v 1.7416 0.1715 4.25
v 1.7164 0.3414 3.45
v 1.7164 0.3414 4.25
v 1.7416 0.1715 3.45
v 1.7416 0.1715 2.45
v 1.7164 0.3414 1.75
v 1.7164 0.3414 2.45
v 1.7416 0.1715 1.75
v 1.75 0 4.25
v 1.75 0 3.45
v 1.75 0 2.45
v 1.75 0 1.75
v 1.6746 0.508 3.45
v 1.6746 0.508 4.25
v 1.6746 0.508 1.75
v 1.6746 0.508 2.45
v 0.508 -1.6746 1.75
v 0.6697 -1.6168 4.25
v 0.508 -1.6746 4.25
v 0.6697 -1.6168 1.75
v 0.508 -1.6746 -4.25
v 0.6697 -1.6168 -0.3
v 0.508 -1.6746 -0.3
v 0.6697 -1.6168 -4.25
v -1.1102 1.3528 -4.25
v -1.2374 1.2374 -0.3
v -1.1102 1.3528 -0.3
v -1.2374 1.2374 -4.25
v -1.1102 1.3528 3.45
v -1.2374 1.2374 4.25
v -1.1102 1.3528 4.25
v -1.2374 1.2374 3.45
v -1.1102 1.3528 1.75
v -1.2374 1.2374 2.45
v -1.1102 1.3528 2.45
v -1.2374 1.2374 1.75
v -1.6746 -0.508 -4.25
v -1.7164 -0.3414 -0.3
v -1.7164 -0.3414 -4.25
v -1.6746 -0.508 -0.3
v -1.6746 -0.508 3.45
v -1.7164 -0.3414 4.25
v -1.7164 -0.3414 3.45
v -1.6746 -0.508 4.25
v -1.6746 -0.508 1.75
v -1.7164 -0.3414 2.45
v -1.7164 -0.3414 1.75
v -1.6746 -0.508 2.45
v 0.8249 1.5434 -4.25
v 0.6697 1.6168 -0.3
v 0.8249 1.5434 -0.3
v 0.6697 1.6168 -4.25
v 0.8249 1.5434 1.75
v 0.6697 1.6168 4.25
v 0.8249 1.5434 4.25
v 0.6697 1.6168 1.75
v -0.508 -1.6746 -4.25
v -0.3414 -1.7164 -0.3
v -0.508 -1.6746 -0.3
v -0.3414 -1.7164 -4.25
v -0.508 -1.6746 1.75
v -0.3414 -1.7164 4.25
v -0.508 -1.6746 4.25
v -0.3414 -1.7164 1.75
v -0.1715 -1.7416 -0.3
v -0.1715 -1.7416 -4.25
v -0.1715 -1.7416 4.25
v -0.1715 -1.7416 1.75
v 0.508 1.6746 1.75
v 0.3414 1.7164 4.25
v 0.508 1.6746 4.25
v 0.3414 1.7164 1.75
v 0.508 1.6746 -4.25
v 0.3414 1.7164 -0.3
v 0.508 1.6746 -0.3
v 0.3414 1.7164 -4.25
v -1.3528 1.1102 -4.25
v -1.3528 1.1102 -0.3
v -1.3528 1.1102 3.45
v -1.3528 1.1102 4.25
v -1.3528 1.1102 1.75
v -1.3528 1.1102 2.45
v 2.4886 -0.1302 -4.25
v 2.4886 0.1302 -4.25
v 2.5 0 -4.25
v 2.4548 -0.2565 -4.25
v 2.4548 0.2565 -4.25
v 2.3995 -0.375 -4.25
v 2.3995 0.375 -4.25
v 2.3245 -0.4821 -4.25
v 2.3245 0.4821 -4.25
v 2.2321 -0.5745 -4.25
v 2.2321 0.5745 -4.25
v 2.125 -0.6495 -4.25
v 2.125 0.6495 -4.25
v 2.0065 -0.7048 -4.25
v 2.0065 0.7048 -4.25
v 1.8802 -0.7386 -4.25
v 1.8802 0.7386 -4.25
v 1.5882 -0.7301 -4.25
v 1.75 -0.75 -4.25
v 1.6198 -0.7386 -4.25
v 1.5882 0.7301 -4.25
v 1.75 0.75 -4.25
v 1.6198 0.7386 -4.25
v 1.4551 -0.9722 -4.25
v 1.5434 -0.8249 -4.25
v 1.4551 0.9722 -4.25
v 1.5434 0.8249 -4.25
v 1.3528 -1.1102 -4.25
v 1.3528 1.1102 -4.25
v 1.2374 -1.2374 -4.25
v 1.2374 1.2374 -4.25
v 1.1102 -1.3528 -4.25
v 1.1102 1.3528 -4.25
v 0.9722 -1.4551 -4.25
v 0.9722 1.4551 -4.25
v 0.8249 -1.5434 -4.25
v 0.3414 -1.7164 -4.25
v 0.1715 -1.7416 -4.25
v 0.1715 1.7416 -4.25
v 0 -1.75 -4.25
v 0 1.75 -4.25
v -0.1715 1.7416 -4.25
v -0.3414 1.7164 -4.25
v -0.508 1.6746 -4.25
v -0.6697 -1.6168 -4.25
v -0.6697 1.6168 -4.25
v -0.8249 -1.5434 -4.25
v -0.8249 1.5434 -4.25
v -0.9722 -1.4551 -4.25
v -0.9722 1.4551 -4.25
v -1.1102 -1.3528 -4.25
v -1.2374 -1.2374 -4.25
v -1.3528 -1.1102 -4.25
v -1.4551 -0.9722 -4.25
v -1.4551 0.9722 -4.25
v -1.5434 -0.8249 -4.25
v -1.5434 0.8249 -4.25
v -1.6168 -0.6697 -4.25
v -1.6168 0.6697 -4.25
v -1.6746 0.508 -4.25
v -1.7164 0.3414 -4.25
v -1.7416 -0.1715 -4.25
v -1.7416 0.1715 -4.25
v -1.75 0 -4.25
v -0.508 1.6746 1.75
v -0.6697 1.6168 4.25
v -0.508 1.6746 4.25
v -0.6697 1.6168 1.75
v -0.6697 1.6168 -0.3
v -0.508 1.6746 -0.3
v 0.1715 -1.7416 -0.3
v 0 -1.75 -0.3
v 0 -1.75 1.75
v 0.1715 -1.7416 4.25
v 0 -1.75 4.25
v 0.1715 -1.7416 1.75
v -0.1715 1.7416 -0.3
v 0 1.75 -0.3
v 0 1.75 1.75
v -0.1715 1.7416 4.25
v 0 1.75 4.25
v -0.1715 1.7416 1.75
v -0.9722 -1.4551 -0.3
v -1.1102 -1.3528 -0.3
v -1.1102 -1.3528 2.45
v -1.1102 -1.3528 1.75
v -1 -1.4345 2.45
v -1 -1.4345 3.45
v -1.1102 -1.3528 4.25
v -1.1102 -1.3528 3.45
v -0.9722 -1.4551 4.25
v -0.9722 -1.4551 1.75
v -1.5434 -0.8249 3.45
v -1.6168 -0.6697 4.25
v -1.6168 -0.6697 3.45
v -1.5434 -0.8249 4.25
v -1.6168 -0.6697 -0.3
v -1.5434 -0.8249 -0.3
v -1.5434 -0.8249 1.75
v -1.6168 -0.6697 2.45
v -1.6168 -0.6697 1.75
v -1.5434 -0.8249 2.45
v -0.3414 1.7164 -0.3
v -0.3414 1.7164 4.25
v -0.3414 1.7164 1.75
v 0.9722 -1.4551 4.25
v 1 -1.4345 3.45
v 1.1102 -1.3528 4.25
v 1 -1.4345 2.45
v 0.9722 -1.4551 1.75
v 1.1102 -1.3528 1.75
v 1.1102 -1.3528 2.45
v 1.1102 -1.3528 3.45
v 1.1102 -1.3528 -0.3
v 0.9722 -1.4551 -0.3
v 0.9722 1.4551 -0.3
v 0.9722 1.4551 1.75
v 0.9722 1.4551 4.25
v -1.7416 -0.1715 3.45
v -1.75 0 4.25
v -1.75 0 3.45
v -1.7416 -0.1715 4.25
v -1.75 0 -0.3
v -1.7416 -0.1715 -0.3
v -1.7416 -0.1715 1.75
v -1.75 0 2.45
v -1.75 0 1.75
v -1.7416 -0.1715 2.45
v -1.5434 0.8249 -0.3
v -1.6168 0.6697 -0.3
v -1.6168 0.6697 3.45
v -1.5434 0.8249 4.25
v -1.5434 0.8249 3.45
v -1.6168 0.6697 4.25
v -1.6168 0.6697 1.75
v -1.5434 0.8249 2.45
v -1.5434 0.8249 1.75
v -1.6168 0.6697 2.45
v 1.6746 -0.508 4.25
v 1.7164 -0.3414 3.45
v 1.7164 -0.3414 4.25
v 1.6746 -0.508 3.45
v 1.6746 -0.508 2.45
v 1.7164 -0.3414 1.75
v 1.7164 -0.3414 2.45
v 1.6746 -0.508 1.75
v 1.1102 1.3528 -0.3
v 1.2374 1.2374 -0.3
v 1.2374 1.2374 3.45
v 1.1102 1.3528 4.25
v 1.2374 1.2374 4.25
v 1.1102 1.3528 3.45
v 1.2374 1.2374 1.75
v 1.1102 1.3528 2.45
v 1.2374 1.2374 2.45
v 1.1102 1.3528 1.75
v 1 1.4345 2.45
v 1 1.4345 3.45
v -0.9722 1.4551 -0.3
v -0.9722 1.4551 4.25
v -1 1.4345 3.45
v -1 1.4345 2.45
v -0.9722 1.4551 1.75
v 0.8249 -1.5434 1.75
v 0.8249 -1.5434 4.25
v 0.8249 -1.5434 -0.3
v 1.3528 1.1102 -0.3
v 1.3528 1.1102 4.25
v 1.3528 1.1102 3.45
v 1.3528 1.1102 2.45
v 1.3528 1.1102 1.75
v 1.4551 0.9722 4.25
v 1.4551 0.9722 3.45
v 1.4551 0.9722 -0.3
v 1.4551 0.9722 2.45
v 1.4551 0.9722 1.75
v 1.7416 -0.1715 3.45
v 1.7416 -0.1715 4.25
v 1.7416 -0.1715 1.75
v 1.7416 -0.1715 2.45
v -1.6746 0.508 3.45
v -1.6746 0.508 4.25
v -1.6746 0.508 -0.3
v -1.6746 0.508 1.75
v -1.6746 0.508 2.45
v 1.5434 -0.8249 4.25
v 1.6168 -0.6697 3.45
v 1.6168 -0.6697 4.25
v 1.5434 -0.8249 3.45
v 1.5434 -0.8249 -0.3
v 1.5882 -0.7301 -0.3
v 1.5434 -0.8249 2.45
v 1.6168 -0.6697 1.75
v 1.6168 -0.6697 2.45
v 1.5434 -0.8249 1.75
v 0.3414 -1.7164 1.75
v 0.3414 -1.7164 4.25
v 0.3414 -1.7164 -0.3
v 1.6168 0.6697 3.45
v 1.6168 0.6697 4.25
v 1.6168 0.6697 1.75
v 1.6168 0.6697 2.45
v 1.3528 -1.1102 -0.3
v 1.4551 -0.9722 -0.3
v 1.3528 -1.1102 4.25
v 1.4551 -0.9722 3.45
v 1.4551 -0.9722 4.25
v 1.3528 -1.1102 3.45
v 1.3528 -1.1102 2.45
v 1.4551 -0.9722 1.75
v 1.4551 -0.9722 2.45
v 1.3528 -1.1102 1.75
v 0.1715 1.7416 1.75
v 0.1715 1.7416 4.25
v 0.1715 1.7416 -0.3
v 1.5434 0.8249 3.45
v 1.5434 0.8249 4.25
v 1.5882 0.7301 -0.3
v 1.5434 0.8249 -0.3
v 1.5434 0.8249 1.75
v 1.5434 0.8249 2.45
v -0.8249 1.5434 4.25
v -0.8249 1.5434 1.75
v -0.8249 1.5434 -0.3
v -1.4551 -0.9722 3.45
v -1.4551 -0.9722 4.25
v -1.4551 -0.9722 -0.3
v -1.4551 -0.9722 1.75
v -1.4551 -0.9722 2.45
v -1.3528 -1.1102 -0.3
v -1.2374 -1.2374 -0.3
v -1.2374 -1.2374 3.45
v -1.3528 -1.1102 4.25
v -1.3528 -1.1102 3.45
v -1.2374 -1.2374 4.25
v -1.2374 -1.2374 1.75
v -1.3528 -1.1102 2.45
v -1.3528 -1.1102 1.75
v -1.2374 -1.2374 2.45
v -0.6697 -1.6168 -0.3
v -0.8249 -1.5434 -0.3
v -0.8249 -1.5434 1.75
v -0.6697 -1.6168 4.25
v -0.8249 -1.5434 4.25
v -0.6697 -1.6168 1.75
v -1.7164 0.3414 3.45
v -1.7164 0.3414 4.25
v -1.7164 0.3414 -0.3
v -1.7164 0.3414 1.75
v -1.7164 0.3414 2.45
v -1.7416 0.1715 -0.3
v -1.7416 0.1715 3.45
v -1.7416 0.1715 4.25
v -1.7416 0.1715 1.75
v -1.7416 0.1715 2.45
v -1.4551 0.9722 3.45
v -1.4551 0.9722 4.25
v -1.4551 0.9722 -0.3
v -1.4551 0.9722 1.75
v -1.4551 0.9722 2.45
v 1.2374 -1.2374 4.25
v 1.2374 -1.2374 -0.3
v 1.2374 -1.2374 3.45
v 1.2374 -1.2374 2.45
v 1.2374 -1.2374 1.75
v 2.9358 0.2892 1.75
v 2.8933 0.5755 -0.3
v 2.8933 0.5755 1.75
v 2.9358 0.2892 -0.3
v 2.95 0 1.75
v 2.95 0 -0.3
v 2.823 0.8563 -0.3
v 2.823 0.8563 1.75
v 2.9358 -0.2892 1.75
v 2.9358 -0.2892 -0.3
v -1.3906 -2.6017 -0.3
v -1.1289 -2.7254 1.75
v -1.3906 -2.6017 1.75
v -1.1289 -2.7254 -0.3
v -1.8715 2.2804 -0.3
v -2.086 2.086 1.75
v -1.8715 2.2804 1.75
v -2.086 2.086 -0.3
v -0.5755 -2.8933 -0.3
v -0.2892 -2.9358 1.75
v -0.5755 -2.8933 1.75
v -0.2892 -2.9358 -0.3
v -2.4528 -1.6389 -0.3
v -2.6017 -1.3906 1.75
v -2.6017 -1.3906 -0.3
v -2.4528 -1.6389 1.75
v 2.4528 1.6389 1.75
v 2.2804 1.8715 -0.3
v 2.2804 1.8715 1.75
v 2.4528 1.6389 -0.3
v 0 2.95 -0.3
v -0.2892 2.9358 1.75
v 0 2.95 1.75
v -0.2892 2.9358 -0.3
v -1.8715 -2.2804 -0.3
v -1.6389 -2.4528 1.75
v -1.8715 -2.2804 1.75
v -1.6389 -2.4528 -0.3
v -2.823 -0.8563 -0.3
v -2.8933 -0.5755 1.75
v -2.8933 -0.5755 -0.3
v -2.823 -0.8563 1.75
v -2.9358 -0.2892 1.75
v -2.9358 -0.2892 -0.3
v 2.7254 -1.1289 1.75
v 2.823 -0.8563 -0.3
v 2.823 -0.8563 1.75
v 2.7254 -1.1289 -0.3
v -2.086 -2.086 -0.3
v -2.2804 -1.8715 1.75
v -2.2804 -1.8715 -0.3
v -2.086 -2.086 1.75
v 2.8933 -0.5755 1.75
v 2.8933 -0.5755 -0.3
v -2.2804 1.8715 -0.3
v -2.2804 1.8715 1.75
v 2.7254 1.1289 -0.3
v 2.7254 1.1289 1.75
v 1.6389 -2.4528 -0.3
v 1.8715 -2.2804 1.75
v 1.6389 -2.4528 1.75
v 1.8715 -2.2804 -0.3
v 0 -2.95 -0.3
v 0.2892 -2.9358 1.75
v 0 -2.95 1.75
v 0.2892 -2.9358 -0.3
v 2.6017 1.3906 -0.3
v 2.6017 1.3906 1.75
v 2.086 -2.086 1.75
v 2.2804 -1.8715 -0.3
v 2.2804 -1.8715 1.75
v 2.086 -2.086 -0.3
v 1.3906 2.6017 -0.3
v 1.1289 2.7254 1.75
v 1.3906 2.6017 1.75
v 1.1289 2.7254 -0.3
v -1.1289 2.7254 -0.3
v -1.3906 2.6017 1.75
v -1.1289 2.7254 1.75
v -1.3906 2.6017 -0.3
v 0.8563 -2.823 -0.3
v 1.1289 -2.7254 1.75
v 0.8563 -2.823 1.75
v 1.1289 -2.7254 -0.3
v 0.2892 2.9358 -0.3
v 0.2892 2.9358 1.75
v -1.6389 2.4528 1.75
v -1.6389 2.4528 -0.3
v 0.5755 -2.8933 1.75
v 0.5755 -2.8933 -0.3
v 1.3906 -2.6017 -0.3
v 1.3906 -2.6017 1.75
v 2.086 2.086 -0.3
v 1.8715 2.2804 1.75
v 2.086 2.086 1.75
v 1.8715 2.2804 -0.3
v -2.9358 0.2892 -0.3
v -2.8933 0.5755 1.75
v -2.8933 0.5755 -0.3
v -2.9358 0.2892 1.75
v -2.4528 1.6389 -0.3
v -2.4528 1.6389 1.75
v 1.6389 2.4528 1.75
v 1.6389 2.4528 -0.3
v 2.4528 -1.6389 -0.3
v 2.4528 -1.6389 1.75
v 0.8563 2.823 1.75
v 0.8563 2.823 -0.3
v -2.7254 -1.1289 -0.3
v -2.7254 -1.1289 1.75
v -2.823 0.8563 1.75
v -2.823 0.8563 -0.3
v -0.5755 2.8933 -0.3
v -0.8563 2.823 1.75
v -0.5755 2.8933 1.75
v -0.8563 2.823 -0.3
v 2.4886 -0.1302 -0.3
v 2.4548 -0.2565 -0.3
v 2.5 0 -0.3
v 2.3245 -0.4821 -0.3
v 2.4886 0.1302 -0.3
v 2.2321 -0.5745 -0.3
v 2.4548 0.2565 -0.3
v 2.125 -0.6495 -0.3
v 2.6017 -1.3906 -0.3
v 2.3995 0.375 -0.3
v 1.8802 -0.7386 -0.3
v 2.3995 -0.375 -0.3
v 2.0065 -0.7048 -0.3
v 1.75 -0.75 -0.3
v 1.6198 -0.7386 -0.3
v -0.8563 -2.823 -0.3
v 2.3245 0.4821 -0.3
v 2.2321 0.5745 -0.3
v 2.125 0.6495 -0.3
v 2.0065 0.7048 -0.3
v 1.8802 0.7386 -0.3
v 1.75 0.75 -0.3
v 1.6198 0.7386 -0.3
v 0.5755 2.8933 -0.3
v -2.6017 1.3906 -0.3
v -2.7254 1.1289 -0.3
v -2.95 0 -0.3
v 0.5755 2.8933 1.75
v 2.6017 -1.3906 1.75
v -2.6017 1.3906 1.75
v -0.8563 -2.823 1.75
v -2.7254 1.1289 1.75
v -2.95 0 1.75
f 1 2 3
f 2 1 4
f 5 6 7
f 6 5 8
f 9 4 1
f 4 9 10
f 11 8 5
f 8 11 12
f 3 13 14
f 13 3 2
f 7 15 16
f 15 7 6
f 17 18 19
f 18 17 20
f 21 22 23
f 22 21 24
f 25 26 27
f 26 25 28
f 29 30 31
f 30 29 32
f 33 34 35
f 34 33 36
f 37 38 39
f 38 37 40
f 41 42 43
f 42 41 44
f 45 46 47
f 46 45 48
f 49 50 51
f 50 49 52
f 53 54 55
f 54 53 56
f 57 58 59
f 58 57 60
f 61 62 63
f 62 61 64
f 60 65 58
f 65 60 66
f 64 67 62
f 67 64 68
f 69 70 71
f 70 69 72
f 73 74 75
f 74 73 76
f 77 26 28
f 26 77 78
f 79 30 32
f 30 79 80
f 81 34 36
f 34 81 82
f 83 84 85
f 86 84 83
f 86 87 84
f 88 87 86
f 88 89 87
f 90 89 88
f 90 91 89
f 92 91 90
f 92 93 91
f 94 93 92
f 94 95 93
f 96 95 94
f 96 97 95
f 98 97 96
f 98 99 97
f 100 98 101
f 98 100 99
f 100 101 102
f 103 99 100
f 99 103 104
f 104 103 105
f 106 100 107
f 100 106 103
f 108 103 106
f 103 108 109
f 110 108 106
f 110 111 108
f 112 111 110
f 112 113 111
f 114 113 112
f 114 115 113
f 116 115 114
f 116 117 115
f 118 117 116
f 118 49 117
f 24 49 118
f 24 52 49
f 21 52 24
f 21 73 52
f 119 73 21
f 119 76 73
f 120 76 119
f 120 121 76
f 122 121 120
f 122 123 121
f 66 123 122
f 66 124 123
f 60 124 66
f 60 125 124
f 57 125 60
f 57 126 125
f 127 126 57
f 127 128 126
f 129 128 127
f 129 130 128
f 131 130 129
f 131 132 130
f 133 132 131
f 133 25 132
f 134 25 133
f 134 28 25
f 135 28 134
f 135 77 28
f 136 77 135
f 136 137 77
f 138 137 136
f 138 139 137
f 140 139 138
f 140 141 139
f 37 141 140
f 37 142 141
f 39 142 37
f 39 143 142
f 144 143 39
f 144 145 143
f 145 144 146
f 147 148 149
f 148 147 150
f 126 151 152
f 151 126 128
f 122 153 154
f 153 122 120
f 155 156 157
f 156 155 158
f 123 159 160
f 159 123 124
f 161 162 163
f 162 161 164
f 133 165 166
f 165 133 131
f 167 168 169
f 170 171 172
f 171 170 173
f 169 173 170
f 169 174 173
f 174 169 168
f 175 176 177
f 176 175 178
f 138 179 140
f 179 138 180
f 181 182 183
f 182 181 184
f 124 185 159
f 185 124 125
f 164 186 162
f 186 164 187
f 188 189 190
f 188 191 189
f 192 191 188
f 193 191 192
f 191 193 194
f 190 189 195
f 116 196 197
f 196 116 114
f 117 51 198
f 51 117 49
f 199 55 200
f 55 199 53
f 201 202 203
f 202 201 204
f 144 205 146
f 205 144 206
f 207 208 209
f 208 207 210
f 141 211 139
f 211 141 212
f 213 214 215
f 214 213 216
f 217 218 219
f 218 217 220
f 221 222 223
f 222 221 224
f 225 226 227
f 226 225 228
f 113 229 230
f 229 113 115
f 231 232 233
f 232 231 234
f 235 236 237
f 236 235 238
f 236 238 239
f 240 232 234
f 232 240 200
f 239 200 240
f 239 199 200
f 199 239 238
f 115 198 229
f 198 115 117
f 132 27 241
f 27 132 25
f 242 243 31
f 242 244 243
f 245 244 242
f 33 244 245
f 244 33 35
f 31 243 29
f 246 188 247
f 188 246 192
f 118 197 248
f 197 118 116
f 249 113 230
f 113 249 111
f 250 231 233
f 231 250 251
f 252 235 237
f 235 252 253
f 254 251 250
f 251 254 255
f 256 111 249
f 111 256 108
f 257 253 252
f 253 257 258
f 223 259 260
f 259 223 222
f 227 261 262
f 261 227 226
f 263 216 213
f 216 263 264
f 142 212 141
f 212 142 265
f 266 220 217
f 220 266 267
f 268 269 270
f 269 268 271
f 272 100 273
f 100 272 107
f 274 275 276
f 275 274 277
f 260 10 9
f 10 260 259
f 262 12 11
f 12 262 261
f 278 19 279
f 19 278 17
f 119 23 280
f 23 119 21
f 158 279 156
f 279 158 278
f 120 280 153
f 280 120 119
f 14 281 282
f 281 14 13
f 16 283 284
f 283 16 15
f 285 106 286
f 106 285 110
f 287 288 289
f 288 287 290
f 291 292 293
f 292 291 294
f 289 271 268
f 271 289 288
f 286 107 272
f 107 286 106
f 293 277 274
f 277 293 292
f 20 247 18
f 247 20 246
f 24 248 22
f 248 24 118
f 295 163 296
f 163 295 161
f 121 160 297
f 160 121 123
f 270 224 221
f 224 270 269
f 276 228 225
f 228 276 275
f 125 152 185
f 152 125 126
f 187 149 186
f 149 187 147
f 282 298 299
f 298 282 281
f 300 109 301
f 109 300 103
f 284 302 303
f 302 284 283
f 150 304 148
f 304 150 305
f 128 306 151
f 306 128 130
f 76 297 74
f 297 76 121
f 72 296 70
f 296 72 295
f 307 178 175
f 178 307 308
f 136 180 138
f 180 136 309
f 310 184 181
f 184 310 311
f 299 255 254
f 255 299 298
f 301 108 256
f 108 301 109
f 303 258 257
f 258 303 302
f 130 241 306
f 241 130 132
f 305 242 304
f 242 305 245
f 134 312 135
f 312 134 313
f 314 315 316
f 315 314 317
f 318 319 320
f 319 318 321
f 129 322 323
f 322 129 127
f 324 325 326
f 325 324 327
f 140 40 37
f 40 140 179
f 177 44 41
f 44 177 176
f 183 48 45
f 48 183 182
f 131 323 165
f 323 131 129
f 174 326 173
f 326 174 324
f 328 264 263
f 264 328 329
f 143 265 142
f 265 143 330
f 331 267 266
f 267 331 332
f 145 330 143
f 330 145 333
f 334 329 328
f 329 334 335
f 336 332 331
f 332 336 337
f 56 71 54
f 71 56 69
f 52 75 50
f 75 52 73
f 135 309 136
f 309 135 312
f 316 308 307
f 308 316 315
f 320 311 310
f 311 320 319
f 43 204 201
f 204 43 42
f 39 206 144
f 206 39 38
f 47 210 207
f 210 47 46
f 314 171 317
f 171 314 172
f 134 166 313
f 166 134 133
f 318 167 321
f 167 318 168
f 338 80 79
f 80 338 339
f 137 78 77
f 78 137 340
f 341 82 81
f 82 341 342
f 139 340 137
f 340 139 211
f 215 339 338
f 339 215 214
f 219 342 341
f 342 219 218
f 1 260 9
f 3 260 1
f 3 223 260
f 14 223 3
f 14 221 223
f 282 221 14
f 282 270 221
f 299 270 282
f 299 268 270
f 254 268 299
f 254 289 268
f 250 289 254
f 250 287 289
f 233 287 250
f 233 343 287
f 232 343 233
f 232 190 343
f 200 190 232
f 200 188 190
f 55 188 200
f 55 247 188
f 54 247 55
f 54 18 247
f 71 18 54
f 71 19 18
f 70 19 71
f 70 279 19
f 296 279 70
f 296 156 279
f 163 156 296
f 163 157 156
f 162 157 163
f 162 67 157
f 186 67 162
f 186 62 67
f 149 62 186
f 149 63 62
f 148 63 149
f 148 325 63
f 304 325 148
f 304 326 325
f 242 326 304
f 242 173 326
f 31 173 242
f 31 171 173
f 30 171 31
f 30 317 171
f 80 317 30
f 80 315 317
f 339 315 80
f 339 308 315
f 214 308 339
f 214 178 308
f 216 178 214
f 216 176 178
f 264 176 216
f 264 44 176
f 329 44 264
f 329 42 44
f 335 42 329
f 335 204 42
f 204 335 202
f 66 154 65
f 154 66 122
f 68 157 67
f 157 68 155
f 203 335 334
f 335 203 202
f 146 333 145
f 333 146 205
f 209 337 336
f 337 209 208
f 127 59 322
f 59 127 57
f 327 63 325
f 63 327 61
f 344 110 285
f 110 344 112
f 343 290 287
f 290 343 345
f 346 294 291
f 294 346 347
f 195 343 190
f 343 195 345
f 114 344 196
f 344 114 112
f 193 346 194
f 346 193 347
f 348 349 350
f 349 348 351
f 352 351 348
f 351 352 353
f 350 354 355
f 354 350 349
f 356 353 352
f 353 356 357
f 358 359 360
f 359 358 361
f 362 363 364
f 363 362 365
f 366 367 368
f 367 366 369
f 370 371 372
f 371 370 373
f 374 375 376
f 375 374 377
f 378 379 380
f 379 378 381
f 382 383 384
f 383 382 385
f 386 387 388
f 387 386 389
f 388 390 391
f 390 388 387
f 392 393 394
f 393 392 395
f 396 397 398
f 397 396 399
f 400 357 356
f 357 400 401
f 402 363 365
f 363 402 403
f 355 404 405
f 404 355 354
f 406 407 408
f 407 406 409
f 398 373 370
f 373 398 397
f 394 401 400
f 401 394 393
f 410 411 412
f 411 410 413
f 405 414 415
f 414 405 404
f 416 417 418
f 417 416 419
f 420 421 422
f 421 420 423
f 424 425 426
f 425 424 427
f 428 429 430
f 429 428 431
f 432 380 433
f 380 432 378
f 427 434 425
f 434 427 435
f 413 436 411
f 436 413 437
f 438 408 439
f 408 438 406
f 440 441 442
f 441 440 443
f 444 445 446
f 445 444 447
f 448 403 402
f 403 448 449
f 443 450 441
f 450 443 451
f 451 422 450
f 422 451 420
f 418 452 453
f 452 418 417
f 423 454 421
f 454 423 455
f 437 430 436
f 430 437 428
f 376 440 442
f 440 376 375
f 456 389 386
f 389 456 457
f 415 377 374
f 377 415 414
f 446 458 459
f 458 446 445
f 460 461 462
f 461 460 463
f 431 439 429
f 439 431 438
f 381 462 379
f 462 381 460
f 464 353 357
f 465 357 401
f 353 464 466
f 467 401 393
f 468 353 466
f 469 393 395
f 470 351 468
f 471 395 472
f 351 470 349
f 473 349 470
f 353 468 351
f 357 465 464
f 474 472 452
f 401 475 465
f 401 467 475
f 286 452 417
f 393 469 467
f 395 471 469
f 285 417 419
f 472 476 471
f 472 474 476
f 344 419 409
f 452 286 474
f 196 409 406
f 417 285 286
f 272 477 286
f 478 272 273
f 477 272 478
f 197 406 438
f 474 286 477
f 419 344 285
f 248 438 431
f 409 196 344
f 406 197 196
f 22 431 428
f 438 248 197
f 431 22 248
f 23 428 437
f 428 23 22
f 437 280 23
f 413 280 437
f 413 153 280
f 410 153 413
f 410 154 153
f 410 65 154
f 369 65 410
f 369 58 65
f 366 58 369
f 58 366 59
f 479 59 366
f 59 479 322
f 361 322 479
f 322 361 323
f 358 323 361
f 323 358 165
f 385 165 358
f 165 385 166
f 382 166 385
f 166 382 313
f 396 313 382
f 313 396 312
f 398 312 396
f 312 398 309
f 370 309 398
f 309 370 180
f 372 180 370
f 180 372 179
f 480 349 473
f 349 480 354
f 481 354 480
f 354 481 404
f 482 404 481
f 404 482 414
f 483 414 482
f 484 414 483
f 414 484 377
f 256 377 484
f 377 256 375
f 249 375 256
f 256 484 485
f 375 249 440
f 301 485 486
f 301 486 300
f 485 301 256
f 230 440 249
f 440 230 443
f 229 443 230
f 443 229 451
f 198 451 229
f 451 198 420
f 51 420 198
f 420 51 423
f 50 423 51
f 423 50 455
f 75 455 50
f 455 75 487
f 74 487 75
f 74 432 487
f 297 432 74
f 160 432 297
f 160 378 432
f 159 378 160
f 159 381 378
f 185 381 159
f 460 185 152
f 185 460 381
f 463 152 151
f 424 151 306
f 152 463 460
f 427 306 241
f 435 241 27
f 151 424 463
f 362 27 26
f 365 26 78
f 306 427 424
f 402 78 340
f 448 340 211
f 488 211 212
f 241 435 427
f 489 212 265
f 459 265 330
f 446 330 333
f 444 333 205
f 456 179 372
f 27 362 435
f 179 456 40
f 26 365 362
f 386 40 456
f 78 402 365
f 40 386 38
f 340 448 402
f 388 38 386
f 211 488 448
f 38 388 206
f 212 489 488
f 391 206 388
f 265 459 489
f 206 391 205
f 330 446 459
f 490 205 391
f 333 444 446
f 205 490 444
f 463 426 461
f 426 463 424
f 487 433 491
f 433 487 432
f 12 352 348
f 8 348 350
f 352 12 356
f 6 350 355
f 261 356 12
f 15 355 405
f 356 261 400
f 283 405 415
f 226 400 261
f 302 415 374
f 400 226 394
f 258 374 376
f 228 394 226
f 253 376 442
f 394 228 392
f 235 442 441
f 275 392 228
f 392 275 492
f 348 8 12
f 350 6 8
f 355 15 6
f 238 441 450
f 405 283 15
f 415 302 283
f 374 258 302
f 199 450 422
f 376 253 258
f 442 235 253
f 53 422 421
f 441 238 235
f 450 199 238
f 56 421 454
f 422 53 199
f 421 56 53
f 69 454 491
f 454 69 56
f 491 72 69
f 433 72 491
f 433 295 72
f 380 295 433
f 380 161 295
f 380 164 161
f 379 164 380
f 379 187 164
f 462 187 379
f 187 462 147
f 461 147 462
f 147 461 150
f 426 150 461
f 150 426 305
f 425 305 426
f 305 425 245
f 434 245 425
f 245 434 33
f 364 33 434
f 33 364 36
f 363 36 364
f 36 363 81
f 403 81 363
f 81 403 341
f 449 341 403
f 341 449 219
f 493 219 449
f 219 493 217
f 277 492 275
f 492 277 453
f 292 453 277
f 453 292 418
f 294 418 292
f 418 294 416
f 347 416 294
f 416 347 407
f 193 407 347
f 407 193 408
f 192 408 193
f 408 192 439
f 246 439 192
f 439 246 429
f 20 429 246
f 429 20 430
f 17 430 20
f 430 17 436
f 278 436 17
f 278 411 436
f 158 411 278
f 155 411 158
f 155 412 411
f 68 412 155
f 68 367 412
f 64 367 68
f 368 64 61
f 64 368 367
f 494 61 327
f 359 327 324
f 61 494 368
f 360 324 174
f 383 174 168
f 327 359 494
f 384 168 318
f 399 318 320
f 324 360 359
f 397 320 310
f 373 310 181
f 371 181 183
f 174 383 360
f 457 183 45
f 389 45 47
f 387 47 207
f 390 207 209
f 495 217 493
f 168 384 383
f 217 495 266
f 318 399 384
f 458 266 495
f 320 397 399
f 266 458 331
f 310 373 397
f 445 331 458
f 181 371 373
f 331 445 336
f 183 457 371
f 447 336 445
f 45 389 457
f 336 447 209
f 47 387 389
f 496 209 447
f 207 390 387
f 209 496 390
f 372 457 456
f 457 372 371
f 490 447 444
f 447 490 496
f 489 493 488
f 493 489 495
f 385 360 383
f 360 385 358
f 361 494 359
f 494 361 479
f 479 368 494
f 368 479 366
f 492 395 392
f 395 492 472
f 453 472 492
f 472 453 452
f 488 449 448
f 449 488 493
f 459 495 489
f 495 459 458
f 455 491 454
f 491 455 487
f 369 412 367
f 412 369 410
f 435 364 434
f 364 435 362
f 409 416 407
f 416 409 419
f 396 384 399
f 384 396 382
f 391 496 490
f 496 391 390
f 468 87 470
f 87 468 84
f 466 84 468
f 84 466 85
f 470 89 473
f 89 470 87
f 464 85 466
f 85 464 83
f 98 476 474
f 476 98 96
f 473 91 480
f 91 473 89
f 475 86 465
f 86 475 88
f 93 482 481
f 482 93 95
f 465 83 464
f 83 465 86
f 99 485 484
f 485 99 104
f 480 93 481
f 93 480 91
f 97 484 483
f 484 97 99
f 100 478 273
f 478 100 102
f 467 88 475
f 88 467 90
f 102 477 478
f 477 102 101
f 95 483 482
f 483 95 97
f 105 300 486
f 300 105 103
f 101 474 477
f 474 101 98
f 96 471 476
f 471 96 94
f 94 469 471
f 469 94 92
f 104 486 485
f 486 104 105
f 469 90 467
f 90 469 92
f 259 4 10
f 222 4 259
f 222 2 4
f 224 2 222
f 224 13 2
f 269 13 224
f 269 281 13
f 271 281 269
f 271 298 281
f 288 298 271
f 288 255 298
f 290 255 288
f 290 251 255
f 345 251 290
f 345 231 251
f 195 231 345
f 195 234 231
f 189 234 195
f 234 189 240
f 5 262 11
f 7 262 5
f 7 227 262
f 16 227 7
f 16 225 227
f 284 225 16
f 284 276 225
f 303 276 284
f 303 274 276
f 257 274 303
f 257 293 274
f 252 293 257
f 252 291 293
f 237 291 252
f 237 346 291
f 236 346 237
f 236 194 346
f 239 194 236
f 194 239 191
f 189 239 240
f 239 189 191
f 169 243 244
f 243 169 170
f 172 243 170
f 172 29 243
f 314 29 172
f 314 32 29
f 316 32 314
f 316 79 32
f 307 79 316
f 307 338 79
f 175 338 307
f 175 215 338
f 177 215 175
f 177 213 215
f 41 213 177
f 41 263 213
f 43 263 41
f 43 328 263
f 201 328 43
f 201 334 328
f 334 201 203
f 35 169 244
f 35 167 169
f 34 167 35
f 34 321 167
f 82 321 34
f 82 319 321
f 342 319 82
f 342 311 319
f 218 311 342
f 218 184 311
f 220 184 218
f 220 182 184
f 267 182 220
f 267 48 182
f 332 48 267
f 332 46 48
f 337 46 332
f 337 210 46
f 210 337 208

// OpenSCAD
// part_id: c4
// name: C4 stepped bush
// source_drawing_ids: DRW-004
// units: mm
// SPDX-License-Identifier: MIT
//
// Part C4: stepped bush/hub associated with the c gear train.
//
// Local origin convention:
// - XY origin is the rotation axis.
// - Z origin is the part midplane for easier assembly rotation.

module part_c4(
    body_d = 3.5,
    body_h = 8.5,
    flange_d = 5.9,
    flange_h = 2.05,
    flange_top_offset = 2.5,
    side_boss_r = 0.75,
    notch_block_w = 4.0,
    notch_block_d = 4.0,
    notch_block_h = 1.0,
    notch_block_gap_from_axis = 1.0,
    notch_block_bottom_gap_above_flange = 0.7
) {
    body_top_z = body_h / 2;
    flange_top_z = body_top_z - flange_top_offset;
    flange_bottom_z = flange_top_z - flange_h;
    lower_stem_h = flange_bottom_z + body_h / 2;
    lower_stem_center_z = -body_h / 2 + lower_stem_h / 2;
    side_boss_center_x = body_d / 2;
    notch_block_center_z = flange_top_z + notch_block_bottom_gap_above_flange + notch_block_h / 2;
    notch_block_center_x = notch_block_gap_from_axis + notch_block_w / 2;

    difference() {
        union() {
            cylinder(d = body_d, h = body_h, center = true, $fn = 64);
            translate([0, 0, flange_top_z - flange_h / 2])
                cylinder(d = flange_d, h = flange_h, center = true, $fn = 64);
            translate([side_boss_center_x, 0, lower_stem_center_z])
                cylinder(r = side_boss_r, h = lower_stem_h, center = true, $fn = 36);
        }

        union() {
            translate([notch_block_center_x, 0, notch_block_center_z])
                cube([notch_block_w, notch_block_d, notch_block_h], center = true);
            translate([-notch_block_center_x, 0, notch_block_center_z])
                cube([notch_block_w, notch_block_d, notch_block_h], center = true);
        }
    }
}

// ---- "main guard" ----
if (is_undef(__LIB_MODE__)) {
    part_c4();
}
